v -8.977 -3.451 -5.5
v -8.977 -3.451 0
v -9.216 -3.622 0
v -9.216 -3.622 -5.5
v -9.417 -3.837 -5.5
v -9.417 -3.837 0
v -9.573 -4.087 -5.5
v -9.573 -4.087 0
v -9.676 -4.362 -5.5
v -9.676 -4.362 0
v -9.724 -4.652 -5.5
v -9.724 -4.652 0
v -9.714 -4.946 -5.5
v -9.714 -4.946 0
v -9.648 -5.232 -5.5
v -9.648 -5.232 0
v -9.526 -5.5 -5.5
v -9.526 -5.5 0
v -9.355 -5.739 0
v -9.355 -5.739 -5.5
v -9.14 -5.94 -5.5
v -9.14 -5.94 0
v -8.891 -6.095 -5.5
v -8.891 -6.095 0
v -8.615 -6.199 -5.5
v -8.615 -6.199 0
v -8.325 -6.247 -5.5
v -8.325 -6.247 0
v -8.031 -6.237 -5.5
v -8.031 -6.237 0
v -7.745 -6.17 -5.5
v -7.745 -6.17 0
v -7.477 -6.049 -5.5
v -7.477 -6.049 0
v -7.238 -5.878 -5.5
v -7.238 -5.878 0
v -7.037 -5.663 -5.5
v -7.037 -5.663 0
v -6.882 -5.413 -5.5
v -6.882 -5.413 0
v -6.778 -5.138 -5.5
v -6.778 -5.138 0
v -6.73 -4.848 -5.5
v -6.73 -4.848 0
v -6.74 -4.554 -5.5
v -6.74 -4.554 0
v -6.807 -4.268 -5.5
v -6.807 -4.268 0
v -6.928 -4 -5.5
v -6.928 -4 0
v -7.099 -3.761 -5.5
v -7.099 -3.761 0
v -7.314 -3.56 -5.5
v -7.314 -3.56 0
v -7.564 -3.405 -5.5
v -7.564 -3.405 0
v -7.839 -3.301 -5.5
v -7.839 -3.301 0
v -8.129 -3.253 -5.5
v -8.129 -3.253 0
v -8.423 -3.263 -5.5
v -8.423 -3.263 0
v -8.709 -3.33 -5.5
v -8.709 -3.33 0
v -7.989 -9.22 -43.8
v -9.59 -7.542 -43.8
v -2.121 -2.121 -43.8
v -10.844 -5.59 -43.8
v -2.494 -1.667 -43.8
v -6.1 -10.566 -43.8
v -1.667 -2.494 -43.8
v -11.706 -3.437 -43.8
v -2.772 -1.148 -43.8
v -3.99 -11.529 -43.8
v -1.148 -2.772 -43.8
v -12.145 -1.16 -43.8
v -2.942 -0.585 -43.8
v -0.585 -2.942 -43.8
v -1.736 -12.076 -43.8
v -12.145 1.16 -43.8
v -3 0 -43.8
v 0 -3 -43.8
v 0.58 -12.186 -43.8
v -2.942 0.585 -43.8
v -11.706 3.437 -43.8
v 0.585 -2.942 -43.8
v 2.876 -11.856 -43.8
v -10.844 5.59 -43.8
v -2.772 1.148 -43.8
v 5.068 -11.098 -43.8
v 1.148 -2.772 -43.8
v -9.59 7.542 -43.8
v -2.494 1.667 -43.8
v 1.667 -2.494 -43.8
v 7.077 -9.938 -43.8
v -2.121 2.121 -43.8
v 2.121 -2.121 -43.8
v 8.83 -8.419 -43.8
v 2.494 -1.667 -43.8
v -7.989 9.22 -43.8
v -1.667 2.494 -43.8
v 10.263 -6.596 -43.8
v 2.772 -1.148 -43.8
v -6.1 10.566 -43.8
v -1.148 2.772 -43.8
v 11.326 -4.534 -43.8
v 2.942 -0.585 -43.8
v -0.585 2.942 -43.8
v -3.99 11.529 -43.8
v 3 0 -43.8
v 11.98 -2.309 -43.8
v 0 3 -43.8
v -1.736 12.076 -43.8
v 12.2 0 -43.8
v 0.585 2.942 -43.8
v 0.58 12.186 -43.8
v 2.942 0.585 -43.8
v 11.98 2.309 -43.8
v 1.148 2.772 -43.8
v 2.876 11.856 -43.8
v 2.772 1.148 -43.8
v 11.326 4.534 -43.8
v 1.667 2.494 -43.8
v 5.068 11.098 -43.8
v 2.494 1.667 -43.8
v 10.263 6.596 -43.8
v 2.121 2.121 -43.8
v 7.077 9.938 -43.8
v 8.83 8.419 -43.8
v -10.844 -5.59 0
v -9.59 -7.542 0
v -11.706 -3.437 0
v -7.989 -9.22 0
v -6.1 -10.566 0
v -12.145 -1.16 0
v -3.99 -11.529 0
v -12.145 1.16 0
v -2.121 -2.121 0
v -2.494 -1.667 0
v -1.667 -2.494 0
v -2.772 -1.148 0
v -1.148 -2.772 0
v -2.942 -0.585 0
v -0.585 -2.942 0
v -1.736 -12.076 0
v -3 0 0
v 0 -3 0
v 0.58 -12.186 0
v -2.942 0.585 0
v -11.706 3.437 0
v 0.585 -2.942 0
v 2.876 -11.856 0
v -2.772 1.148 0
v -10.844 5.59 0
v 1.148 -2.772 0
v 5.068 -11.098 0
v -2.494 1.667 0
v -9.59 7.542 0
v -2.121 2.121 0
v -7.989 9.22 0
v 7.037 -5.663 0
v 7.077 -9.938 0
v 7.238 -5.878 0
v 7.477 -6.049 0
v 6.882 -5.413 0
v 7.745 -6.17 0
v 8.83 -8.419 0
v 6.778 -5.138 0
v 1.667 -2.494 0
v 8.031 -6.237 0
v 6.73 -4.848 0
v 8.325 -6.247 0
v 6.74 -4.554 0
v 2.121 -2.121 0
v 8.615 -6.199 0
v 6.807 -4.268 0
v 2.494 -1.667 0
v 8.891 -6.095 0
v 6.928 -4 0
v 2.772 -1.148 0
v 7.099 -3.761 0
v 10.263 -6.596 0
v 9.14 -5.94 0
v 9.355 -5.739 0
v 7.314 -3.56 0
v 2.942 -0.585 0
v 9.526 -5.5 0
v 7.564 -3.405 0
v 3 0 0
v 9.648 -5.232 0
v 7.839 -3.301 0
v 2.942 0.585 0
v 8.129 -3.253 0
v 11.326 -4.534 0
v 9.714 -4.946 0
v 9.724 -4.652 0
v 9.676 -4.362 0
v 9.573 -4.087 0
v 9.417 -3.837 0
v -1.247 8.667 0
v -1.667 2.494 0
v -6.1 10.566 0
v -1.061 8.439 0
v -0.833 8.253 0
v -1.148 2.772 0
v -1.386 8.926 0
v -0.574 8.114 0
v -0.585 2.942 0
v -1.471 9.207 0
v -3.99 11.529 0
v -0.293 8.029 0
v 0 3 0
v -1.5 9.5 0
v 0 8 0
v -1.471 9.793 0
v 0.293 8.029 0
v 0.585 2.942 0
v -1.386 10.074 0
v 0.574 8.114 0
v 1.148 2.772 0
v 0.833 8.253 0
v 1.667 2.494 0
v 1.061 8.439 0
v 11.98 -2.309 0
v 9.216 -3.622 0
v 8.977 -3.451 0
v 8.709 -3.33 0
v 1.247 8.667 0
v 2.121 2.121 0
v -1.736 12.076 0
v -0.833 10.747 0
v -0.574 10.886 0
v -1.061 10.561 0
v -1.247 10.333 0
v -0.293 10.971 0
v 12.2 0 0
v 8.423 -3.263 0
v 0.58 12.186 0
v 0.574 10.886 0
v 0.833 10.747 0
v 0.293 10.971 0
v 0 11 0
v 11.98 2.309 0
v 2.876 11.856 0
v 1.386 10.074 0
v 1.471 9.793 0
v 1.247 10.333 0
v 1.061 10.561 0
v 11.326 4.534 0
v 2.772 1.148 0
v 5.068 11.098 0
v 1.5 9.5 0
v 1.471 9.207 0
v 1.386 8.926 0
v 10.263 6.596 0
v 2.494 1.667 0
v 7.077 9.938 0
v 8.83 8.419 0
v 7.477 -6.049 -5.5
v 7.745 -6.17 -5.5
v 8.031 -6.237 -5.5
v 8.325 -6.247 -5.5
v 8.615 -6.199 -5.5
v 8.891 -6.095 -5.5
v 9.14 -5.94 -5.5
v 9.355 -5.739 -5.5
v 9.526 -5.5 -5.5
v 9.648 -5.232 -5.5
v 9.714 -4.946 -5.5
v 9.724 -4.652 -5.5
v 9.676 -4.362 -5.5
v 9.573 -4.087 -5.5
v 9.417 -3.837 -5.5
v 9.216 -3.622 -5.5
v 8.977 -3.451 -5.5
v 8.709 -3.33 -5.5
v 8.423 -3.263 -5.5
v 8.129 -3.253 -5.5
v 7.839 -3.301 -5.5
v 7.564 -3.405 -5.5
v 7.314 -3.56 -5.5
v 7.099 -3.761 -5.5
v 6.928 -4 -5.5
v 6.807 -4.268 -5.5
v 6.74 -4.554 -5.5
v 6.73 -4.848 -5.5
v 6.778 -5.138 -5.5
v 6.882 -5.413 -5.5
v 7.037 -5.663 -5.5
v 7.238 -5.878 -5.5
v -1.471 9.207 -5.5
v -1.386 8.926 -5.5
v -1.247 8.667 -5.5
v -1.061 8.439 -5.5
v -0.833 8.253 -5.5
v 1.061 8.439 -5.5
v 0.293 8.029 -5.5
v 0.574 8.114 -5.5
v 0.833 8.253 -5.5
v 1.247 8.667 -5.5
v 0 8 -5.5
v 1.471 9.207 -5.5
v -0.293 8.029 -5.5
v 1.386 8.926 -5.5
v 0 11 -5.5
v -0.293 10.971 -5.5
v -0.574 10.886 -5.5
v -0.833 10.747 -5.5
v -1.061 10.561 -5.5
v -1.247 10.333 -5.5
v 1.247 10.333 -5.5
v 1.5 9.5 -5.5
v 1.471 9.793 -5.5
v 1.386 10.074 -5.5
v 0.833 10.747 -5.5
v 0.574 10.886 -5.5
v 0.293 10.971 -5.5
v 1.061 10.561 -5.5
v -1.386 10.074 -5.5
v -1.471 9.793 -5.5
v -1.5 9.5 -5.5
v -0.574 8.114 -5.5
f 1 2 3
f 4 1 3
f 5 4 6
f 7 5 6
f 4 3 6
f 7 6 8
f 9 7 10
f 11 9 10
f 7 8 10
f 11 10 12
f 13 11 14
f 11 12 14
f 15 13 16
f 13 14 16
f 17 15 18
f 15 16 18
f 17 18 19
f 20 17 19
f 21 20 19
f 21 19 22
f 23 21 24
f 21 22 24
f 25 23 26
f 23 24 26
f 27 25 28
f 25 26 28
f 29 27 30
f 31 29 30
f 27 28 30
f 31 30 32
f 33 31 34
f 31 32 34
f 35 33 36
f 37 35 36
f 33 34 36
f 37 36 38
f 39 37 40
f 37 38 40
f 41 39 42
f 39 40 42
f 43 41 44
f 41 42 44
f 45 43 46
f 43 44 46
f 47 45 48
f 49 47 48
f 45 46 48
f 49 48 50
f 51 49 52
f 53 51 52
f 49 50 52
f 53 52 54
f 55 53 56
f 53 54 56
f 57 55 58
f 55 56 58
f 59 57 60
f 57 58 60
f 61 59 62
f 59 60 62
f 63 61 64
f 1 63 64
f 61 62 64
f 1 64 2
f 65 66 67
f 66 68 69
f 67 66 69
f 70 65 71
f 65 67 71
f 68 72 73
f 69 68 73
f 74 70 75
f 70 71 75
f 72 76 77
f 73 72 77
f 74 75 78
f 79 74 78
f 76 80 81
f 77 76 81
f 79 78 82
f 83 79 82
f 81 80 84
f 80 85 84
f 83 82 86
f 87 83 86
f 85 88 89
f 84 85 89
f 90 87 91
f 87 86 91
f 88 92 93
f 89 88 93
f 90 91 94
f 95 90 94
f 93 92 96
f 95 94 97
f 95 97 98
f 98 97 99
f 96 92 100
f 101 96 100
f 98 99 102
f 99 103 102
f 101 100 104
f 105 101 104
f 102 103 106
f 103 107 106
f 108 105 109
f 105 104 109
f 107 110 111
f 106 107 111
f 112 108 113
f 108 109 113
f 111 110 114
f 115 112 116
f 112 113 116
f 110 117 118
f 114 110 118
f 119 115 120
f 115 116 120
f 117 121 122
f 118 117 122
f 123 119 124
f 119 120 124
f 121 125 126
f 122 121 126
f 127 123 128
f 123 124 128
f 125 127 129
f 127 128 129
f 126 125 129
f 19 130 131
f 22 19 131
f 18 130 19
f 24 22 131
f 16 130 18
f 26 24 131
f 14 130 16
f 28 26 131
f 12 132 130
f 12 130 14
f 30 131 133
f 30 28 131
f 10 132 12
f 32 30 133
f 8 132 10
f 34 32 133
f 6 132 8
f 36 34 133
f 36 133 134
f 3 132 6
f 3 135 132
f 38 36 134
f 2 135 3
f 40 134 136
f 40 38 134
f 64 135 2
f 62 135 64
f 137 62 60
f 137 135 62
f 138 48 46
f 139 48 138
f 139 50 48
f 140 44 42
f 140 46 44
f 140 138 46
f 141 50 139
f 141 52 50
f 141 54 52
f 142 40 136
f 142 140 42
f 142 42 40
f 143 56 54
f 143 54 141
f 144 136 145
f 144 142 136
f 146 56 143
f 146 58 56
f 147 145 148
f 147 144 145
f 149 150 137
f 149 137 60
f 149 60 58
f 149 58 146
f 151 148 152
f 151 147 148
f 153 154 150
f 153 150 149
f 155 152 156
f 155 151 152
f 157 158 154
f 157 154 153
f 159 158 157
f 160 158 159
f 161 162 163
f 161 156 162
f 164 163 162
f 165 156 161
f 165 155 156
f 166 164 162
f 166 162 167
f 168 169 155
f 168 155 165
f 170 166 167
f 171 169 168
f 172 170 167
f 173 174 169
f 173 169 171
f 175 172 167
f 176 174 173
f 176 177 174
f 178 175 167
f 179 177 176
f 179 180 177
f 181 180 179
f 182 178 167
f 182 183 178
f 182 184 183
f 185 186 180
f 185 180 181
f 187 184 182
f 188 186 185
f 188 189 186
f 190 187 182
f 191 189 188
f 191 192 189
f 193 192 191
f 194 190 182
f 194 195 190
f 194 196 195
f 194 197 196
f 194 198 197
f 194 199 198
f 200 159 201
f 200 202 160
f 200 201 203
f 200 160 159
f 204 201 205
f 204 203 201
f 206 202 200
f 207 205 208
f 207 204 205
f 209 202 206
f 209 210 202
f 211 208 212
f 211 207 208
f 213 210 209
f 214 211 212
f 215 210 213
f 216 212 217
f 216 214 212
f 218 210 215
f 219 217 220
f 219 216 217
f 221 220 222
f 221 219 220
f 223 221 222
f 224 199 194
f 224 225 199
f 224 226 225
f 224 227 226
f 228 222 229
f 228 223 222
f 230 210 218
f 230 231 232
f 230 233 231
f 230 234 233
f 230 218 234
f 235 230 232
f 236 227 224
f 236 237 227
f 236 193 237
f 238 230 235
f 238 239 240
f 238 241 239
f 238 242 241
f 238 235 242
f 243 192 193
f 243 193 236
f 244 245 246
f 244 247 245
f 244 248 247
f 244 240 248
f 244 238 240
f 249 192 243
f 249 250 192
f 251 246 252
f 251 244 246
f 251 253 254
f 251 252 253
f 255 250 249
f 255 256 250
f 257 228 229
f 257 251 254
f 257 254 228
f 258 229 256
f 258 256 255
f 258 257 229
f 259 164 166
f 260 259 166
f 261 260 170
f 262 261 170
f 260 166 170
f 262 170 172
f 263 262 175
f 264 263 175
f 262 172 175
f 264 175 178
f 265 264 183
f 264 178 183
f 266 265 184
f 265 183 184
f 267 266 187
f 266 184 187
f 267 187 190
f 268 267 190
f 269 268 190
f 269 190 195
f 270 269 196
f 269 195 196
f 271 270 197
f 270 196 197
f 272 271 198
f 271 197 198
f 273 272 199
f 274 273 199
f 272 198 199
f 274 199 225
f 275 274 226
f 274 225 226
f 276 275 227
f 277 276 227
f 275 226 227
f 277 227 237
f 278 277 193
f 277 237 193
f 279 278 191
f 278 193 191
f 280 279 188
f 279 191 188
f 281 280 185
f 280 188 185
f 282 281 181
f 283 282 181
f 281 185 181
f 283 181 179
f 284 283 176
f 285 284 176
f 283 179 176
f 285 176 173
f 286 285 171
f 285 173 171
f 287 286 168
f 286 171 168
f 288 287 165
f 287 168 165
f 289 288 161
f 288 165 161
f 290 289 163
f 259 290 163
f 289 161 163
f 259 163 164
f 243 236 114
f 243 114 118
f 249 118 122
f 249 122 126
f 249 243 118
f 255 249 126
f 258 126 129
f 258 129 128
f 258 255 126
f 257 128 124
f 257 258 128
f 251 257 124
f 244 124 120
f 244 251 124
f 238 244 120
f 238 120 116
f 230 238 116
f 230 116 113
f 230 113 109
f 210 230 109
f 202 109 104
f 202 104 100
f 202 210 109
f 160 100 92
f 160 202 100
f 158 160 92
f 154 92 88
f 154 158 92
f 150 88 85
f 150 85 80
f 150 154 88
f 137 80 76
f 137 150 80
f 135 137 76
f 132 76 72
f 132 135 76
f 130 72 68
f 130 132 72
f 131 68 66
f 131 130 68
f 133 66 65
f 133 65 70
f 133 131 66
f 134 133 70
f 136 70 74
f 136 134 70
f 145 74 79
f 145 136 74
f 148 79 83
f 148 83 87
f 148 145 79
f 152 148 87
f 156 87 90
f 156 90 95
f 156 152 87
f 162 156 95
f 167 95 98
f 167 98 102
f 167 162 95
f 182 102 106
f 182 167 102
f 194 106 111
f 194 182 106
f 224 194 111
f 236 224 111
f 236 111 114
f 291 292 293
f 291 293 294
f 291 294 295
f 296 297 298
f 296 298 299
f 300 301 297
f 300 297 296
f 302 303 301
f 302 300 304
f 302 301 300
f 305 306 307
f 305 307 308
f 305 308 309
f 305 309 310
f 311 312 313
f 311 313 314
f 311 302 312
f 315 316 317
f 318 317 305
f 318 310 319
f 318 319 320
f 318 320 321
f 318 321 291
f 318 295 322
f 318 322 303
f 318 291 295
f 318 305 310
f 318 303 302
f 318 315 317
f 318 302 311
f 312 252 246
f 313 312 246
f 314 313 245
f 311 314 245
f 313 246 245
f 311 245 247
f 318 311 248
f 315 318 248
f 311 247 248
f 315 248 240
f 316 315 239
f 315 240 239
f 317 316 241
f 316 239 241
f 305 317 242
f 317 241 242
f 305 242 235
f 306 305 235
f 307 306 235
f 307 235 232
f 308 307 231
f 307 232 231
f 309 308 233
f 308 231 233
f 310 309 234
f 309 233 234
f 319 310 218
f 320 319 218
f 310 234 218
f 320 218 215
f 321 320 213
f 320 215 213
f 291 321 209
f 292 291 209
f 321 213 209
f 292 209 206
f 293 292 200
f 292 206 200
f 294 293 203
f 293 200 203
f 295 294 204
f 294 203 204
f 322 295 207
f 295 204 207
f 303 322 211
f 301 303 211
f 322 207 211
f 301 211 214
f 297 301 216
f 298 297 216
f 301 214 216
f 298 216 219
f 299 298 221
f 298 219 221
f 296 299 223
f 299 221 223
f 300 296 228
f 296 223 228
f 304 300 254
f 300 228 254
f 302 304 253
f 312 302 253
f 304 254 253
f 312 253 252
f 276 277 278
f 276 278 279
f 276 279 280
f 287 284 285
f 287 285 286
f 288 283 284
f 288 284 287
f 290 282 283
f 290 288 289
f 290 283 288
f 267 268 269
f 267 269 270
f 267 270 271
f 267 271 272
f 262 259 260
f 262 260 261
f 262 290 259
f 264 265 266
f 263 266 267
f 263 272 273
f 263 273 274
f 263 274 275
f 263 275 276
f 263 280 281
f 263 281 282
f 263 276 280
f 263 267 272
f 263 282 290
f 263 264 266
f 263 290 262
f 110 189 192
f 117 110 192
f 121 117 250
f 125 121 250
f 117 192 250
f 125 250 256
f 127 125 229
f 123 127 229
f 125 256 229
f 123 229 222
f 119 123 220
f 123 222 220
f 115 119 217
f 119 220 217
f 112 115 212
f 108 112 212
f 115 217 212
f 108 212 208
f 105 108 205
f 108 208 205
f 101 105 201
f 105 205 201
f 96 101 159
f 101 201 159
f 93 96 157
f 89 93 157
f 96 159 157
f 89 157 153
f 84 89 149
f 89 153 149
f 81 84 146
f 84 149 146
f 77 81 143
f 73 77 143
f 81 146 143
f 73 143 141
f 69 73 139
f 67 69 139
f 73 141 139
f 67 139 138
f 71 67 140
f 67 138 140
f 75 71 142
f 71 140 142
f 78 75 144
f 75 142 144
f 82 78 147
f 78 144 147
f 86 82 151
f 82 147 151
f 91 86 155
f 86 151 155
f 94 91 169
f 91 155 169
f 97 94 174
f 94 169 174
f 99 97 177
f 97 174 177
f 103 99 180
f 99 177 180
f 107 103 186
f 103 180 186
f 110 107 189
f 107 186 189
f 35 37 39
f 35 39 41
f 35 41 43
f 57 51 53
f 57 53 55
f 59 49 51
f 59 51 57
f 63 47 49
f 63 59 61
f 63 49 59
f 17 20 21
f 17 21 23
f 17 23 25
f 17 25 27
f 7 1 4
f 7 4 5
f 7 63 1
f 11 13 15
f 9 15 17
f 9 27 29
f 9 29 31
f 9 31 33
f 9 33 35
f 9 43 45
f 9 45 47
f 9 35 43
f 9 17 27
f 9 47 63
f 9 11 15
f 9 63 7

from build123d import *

# Parameters (mm, degrees)
SKETCH_1_R               = 12.2
SKETCH_1_R_2             = 3
EXTRUDE_1_DEPTH          = 43.8
SKETCH_2_R               = 1.5
CUT_EXTRUDE_1_DEPTH      = 5.5
PATTERN_CIRCULAR_2_COUNT = 3


with BuildPart() as part:
    # 草图1 → 凸台-拉伸1 (new body)
    with BuildSketch(Plane.XY):
        Circle(SKETCH_1_R)
        Circle(SKETCH_1_R_2, mode=Mode.SUBTRACT)
    extrude(amount=-EXTRUDE_1_DEPTH)

    # 草图2 → 切除-拉伸1 (cut)
    with BuildSketch(Plane.XY):
        with Locations((0, 9.5)):
            Circle(SKETCH_2_R)
    cut_extrude_1 = extrude(amount=-CUT_EXTRUDE_1_DEPTH, mode=Mode.SUBTRACT)

    # 阵列(圆周)2: 切除-拉伸1 ×3 about axis
    pattern_circular_2_axis = Axis((0, 0, -43.8), (0, 0, 1))
    for i in range(1, PATTERN_CIRCULAR_2_COUNT):
        add(cut_extrude_1.rotate(pattern_circular_2_axis, i * 360 / PATTERN_CIRCULAR_2_COUNT), mode=Mode.SUBTRACT)


solid = part.part
